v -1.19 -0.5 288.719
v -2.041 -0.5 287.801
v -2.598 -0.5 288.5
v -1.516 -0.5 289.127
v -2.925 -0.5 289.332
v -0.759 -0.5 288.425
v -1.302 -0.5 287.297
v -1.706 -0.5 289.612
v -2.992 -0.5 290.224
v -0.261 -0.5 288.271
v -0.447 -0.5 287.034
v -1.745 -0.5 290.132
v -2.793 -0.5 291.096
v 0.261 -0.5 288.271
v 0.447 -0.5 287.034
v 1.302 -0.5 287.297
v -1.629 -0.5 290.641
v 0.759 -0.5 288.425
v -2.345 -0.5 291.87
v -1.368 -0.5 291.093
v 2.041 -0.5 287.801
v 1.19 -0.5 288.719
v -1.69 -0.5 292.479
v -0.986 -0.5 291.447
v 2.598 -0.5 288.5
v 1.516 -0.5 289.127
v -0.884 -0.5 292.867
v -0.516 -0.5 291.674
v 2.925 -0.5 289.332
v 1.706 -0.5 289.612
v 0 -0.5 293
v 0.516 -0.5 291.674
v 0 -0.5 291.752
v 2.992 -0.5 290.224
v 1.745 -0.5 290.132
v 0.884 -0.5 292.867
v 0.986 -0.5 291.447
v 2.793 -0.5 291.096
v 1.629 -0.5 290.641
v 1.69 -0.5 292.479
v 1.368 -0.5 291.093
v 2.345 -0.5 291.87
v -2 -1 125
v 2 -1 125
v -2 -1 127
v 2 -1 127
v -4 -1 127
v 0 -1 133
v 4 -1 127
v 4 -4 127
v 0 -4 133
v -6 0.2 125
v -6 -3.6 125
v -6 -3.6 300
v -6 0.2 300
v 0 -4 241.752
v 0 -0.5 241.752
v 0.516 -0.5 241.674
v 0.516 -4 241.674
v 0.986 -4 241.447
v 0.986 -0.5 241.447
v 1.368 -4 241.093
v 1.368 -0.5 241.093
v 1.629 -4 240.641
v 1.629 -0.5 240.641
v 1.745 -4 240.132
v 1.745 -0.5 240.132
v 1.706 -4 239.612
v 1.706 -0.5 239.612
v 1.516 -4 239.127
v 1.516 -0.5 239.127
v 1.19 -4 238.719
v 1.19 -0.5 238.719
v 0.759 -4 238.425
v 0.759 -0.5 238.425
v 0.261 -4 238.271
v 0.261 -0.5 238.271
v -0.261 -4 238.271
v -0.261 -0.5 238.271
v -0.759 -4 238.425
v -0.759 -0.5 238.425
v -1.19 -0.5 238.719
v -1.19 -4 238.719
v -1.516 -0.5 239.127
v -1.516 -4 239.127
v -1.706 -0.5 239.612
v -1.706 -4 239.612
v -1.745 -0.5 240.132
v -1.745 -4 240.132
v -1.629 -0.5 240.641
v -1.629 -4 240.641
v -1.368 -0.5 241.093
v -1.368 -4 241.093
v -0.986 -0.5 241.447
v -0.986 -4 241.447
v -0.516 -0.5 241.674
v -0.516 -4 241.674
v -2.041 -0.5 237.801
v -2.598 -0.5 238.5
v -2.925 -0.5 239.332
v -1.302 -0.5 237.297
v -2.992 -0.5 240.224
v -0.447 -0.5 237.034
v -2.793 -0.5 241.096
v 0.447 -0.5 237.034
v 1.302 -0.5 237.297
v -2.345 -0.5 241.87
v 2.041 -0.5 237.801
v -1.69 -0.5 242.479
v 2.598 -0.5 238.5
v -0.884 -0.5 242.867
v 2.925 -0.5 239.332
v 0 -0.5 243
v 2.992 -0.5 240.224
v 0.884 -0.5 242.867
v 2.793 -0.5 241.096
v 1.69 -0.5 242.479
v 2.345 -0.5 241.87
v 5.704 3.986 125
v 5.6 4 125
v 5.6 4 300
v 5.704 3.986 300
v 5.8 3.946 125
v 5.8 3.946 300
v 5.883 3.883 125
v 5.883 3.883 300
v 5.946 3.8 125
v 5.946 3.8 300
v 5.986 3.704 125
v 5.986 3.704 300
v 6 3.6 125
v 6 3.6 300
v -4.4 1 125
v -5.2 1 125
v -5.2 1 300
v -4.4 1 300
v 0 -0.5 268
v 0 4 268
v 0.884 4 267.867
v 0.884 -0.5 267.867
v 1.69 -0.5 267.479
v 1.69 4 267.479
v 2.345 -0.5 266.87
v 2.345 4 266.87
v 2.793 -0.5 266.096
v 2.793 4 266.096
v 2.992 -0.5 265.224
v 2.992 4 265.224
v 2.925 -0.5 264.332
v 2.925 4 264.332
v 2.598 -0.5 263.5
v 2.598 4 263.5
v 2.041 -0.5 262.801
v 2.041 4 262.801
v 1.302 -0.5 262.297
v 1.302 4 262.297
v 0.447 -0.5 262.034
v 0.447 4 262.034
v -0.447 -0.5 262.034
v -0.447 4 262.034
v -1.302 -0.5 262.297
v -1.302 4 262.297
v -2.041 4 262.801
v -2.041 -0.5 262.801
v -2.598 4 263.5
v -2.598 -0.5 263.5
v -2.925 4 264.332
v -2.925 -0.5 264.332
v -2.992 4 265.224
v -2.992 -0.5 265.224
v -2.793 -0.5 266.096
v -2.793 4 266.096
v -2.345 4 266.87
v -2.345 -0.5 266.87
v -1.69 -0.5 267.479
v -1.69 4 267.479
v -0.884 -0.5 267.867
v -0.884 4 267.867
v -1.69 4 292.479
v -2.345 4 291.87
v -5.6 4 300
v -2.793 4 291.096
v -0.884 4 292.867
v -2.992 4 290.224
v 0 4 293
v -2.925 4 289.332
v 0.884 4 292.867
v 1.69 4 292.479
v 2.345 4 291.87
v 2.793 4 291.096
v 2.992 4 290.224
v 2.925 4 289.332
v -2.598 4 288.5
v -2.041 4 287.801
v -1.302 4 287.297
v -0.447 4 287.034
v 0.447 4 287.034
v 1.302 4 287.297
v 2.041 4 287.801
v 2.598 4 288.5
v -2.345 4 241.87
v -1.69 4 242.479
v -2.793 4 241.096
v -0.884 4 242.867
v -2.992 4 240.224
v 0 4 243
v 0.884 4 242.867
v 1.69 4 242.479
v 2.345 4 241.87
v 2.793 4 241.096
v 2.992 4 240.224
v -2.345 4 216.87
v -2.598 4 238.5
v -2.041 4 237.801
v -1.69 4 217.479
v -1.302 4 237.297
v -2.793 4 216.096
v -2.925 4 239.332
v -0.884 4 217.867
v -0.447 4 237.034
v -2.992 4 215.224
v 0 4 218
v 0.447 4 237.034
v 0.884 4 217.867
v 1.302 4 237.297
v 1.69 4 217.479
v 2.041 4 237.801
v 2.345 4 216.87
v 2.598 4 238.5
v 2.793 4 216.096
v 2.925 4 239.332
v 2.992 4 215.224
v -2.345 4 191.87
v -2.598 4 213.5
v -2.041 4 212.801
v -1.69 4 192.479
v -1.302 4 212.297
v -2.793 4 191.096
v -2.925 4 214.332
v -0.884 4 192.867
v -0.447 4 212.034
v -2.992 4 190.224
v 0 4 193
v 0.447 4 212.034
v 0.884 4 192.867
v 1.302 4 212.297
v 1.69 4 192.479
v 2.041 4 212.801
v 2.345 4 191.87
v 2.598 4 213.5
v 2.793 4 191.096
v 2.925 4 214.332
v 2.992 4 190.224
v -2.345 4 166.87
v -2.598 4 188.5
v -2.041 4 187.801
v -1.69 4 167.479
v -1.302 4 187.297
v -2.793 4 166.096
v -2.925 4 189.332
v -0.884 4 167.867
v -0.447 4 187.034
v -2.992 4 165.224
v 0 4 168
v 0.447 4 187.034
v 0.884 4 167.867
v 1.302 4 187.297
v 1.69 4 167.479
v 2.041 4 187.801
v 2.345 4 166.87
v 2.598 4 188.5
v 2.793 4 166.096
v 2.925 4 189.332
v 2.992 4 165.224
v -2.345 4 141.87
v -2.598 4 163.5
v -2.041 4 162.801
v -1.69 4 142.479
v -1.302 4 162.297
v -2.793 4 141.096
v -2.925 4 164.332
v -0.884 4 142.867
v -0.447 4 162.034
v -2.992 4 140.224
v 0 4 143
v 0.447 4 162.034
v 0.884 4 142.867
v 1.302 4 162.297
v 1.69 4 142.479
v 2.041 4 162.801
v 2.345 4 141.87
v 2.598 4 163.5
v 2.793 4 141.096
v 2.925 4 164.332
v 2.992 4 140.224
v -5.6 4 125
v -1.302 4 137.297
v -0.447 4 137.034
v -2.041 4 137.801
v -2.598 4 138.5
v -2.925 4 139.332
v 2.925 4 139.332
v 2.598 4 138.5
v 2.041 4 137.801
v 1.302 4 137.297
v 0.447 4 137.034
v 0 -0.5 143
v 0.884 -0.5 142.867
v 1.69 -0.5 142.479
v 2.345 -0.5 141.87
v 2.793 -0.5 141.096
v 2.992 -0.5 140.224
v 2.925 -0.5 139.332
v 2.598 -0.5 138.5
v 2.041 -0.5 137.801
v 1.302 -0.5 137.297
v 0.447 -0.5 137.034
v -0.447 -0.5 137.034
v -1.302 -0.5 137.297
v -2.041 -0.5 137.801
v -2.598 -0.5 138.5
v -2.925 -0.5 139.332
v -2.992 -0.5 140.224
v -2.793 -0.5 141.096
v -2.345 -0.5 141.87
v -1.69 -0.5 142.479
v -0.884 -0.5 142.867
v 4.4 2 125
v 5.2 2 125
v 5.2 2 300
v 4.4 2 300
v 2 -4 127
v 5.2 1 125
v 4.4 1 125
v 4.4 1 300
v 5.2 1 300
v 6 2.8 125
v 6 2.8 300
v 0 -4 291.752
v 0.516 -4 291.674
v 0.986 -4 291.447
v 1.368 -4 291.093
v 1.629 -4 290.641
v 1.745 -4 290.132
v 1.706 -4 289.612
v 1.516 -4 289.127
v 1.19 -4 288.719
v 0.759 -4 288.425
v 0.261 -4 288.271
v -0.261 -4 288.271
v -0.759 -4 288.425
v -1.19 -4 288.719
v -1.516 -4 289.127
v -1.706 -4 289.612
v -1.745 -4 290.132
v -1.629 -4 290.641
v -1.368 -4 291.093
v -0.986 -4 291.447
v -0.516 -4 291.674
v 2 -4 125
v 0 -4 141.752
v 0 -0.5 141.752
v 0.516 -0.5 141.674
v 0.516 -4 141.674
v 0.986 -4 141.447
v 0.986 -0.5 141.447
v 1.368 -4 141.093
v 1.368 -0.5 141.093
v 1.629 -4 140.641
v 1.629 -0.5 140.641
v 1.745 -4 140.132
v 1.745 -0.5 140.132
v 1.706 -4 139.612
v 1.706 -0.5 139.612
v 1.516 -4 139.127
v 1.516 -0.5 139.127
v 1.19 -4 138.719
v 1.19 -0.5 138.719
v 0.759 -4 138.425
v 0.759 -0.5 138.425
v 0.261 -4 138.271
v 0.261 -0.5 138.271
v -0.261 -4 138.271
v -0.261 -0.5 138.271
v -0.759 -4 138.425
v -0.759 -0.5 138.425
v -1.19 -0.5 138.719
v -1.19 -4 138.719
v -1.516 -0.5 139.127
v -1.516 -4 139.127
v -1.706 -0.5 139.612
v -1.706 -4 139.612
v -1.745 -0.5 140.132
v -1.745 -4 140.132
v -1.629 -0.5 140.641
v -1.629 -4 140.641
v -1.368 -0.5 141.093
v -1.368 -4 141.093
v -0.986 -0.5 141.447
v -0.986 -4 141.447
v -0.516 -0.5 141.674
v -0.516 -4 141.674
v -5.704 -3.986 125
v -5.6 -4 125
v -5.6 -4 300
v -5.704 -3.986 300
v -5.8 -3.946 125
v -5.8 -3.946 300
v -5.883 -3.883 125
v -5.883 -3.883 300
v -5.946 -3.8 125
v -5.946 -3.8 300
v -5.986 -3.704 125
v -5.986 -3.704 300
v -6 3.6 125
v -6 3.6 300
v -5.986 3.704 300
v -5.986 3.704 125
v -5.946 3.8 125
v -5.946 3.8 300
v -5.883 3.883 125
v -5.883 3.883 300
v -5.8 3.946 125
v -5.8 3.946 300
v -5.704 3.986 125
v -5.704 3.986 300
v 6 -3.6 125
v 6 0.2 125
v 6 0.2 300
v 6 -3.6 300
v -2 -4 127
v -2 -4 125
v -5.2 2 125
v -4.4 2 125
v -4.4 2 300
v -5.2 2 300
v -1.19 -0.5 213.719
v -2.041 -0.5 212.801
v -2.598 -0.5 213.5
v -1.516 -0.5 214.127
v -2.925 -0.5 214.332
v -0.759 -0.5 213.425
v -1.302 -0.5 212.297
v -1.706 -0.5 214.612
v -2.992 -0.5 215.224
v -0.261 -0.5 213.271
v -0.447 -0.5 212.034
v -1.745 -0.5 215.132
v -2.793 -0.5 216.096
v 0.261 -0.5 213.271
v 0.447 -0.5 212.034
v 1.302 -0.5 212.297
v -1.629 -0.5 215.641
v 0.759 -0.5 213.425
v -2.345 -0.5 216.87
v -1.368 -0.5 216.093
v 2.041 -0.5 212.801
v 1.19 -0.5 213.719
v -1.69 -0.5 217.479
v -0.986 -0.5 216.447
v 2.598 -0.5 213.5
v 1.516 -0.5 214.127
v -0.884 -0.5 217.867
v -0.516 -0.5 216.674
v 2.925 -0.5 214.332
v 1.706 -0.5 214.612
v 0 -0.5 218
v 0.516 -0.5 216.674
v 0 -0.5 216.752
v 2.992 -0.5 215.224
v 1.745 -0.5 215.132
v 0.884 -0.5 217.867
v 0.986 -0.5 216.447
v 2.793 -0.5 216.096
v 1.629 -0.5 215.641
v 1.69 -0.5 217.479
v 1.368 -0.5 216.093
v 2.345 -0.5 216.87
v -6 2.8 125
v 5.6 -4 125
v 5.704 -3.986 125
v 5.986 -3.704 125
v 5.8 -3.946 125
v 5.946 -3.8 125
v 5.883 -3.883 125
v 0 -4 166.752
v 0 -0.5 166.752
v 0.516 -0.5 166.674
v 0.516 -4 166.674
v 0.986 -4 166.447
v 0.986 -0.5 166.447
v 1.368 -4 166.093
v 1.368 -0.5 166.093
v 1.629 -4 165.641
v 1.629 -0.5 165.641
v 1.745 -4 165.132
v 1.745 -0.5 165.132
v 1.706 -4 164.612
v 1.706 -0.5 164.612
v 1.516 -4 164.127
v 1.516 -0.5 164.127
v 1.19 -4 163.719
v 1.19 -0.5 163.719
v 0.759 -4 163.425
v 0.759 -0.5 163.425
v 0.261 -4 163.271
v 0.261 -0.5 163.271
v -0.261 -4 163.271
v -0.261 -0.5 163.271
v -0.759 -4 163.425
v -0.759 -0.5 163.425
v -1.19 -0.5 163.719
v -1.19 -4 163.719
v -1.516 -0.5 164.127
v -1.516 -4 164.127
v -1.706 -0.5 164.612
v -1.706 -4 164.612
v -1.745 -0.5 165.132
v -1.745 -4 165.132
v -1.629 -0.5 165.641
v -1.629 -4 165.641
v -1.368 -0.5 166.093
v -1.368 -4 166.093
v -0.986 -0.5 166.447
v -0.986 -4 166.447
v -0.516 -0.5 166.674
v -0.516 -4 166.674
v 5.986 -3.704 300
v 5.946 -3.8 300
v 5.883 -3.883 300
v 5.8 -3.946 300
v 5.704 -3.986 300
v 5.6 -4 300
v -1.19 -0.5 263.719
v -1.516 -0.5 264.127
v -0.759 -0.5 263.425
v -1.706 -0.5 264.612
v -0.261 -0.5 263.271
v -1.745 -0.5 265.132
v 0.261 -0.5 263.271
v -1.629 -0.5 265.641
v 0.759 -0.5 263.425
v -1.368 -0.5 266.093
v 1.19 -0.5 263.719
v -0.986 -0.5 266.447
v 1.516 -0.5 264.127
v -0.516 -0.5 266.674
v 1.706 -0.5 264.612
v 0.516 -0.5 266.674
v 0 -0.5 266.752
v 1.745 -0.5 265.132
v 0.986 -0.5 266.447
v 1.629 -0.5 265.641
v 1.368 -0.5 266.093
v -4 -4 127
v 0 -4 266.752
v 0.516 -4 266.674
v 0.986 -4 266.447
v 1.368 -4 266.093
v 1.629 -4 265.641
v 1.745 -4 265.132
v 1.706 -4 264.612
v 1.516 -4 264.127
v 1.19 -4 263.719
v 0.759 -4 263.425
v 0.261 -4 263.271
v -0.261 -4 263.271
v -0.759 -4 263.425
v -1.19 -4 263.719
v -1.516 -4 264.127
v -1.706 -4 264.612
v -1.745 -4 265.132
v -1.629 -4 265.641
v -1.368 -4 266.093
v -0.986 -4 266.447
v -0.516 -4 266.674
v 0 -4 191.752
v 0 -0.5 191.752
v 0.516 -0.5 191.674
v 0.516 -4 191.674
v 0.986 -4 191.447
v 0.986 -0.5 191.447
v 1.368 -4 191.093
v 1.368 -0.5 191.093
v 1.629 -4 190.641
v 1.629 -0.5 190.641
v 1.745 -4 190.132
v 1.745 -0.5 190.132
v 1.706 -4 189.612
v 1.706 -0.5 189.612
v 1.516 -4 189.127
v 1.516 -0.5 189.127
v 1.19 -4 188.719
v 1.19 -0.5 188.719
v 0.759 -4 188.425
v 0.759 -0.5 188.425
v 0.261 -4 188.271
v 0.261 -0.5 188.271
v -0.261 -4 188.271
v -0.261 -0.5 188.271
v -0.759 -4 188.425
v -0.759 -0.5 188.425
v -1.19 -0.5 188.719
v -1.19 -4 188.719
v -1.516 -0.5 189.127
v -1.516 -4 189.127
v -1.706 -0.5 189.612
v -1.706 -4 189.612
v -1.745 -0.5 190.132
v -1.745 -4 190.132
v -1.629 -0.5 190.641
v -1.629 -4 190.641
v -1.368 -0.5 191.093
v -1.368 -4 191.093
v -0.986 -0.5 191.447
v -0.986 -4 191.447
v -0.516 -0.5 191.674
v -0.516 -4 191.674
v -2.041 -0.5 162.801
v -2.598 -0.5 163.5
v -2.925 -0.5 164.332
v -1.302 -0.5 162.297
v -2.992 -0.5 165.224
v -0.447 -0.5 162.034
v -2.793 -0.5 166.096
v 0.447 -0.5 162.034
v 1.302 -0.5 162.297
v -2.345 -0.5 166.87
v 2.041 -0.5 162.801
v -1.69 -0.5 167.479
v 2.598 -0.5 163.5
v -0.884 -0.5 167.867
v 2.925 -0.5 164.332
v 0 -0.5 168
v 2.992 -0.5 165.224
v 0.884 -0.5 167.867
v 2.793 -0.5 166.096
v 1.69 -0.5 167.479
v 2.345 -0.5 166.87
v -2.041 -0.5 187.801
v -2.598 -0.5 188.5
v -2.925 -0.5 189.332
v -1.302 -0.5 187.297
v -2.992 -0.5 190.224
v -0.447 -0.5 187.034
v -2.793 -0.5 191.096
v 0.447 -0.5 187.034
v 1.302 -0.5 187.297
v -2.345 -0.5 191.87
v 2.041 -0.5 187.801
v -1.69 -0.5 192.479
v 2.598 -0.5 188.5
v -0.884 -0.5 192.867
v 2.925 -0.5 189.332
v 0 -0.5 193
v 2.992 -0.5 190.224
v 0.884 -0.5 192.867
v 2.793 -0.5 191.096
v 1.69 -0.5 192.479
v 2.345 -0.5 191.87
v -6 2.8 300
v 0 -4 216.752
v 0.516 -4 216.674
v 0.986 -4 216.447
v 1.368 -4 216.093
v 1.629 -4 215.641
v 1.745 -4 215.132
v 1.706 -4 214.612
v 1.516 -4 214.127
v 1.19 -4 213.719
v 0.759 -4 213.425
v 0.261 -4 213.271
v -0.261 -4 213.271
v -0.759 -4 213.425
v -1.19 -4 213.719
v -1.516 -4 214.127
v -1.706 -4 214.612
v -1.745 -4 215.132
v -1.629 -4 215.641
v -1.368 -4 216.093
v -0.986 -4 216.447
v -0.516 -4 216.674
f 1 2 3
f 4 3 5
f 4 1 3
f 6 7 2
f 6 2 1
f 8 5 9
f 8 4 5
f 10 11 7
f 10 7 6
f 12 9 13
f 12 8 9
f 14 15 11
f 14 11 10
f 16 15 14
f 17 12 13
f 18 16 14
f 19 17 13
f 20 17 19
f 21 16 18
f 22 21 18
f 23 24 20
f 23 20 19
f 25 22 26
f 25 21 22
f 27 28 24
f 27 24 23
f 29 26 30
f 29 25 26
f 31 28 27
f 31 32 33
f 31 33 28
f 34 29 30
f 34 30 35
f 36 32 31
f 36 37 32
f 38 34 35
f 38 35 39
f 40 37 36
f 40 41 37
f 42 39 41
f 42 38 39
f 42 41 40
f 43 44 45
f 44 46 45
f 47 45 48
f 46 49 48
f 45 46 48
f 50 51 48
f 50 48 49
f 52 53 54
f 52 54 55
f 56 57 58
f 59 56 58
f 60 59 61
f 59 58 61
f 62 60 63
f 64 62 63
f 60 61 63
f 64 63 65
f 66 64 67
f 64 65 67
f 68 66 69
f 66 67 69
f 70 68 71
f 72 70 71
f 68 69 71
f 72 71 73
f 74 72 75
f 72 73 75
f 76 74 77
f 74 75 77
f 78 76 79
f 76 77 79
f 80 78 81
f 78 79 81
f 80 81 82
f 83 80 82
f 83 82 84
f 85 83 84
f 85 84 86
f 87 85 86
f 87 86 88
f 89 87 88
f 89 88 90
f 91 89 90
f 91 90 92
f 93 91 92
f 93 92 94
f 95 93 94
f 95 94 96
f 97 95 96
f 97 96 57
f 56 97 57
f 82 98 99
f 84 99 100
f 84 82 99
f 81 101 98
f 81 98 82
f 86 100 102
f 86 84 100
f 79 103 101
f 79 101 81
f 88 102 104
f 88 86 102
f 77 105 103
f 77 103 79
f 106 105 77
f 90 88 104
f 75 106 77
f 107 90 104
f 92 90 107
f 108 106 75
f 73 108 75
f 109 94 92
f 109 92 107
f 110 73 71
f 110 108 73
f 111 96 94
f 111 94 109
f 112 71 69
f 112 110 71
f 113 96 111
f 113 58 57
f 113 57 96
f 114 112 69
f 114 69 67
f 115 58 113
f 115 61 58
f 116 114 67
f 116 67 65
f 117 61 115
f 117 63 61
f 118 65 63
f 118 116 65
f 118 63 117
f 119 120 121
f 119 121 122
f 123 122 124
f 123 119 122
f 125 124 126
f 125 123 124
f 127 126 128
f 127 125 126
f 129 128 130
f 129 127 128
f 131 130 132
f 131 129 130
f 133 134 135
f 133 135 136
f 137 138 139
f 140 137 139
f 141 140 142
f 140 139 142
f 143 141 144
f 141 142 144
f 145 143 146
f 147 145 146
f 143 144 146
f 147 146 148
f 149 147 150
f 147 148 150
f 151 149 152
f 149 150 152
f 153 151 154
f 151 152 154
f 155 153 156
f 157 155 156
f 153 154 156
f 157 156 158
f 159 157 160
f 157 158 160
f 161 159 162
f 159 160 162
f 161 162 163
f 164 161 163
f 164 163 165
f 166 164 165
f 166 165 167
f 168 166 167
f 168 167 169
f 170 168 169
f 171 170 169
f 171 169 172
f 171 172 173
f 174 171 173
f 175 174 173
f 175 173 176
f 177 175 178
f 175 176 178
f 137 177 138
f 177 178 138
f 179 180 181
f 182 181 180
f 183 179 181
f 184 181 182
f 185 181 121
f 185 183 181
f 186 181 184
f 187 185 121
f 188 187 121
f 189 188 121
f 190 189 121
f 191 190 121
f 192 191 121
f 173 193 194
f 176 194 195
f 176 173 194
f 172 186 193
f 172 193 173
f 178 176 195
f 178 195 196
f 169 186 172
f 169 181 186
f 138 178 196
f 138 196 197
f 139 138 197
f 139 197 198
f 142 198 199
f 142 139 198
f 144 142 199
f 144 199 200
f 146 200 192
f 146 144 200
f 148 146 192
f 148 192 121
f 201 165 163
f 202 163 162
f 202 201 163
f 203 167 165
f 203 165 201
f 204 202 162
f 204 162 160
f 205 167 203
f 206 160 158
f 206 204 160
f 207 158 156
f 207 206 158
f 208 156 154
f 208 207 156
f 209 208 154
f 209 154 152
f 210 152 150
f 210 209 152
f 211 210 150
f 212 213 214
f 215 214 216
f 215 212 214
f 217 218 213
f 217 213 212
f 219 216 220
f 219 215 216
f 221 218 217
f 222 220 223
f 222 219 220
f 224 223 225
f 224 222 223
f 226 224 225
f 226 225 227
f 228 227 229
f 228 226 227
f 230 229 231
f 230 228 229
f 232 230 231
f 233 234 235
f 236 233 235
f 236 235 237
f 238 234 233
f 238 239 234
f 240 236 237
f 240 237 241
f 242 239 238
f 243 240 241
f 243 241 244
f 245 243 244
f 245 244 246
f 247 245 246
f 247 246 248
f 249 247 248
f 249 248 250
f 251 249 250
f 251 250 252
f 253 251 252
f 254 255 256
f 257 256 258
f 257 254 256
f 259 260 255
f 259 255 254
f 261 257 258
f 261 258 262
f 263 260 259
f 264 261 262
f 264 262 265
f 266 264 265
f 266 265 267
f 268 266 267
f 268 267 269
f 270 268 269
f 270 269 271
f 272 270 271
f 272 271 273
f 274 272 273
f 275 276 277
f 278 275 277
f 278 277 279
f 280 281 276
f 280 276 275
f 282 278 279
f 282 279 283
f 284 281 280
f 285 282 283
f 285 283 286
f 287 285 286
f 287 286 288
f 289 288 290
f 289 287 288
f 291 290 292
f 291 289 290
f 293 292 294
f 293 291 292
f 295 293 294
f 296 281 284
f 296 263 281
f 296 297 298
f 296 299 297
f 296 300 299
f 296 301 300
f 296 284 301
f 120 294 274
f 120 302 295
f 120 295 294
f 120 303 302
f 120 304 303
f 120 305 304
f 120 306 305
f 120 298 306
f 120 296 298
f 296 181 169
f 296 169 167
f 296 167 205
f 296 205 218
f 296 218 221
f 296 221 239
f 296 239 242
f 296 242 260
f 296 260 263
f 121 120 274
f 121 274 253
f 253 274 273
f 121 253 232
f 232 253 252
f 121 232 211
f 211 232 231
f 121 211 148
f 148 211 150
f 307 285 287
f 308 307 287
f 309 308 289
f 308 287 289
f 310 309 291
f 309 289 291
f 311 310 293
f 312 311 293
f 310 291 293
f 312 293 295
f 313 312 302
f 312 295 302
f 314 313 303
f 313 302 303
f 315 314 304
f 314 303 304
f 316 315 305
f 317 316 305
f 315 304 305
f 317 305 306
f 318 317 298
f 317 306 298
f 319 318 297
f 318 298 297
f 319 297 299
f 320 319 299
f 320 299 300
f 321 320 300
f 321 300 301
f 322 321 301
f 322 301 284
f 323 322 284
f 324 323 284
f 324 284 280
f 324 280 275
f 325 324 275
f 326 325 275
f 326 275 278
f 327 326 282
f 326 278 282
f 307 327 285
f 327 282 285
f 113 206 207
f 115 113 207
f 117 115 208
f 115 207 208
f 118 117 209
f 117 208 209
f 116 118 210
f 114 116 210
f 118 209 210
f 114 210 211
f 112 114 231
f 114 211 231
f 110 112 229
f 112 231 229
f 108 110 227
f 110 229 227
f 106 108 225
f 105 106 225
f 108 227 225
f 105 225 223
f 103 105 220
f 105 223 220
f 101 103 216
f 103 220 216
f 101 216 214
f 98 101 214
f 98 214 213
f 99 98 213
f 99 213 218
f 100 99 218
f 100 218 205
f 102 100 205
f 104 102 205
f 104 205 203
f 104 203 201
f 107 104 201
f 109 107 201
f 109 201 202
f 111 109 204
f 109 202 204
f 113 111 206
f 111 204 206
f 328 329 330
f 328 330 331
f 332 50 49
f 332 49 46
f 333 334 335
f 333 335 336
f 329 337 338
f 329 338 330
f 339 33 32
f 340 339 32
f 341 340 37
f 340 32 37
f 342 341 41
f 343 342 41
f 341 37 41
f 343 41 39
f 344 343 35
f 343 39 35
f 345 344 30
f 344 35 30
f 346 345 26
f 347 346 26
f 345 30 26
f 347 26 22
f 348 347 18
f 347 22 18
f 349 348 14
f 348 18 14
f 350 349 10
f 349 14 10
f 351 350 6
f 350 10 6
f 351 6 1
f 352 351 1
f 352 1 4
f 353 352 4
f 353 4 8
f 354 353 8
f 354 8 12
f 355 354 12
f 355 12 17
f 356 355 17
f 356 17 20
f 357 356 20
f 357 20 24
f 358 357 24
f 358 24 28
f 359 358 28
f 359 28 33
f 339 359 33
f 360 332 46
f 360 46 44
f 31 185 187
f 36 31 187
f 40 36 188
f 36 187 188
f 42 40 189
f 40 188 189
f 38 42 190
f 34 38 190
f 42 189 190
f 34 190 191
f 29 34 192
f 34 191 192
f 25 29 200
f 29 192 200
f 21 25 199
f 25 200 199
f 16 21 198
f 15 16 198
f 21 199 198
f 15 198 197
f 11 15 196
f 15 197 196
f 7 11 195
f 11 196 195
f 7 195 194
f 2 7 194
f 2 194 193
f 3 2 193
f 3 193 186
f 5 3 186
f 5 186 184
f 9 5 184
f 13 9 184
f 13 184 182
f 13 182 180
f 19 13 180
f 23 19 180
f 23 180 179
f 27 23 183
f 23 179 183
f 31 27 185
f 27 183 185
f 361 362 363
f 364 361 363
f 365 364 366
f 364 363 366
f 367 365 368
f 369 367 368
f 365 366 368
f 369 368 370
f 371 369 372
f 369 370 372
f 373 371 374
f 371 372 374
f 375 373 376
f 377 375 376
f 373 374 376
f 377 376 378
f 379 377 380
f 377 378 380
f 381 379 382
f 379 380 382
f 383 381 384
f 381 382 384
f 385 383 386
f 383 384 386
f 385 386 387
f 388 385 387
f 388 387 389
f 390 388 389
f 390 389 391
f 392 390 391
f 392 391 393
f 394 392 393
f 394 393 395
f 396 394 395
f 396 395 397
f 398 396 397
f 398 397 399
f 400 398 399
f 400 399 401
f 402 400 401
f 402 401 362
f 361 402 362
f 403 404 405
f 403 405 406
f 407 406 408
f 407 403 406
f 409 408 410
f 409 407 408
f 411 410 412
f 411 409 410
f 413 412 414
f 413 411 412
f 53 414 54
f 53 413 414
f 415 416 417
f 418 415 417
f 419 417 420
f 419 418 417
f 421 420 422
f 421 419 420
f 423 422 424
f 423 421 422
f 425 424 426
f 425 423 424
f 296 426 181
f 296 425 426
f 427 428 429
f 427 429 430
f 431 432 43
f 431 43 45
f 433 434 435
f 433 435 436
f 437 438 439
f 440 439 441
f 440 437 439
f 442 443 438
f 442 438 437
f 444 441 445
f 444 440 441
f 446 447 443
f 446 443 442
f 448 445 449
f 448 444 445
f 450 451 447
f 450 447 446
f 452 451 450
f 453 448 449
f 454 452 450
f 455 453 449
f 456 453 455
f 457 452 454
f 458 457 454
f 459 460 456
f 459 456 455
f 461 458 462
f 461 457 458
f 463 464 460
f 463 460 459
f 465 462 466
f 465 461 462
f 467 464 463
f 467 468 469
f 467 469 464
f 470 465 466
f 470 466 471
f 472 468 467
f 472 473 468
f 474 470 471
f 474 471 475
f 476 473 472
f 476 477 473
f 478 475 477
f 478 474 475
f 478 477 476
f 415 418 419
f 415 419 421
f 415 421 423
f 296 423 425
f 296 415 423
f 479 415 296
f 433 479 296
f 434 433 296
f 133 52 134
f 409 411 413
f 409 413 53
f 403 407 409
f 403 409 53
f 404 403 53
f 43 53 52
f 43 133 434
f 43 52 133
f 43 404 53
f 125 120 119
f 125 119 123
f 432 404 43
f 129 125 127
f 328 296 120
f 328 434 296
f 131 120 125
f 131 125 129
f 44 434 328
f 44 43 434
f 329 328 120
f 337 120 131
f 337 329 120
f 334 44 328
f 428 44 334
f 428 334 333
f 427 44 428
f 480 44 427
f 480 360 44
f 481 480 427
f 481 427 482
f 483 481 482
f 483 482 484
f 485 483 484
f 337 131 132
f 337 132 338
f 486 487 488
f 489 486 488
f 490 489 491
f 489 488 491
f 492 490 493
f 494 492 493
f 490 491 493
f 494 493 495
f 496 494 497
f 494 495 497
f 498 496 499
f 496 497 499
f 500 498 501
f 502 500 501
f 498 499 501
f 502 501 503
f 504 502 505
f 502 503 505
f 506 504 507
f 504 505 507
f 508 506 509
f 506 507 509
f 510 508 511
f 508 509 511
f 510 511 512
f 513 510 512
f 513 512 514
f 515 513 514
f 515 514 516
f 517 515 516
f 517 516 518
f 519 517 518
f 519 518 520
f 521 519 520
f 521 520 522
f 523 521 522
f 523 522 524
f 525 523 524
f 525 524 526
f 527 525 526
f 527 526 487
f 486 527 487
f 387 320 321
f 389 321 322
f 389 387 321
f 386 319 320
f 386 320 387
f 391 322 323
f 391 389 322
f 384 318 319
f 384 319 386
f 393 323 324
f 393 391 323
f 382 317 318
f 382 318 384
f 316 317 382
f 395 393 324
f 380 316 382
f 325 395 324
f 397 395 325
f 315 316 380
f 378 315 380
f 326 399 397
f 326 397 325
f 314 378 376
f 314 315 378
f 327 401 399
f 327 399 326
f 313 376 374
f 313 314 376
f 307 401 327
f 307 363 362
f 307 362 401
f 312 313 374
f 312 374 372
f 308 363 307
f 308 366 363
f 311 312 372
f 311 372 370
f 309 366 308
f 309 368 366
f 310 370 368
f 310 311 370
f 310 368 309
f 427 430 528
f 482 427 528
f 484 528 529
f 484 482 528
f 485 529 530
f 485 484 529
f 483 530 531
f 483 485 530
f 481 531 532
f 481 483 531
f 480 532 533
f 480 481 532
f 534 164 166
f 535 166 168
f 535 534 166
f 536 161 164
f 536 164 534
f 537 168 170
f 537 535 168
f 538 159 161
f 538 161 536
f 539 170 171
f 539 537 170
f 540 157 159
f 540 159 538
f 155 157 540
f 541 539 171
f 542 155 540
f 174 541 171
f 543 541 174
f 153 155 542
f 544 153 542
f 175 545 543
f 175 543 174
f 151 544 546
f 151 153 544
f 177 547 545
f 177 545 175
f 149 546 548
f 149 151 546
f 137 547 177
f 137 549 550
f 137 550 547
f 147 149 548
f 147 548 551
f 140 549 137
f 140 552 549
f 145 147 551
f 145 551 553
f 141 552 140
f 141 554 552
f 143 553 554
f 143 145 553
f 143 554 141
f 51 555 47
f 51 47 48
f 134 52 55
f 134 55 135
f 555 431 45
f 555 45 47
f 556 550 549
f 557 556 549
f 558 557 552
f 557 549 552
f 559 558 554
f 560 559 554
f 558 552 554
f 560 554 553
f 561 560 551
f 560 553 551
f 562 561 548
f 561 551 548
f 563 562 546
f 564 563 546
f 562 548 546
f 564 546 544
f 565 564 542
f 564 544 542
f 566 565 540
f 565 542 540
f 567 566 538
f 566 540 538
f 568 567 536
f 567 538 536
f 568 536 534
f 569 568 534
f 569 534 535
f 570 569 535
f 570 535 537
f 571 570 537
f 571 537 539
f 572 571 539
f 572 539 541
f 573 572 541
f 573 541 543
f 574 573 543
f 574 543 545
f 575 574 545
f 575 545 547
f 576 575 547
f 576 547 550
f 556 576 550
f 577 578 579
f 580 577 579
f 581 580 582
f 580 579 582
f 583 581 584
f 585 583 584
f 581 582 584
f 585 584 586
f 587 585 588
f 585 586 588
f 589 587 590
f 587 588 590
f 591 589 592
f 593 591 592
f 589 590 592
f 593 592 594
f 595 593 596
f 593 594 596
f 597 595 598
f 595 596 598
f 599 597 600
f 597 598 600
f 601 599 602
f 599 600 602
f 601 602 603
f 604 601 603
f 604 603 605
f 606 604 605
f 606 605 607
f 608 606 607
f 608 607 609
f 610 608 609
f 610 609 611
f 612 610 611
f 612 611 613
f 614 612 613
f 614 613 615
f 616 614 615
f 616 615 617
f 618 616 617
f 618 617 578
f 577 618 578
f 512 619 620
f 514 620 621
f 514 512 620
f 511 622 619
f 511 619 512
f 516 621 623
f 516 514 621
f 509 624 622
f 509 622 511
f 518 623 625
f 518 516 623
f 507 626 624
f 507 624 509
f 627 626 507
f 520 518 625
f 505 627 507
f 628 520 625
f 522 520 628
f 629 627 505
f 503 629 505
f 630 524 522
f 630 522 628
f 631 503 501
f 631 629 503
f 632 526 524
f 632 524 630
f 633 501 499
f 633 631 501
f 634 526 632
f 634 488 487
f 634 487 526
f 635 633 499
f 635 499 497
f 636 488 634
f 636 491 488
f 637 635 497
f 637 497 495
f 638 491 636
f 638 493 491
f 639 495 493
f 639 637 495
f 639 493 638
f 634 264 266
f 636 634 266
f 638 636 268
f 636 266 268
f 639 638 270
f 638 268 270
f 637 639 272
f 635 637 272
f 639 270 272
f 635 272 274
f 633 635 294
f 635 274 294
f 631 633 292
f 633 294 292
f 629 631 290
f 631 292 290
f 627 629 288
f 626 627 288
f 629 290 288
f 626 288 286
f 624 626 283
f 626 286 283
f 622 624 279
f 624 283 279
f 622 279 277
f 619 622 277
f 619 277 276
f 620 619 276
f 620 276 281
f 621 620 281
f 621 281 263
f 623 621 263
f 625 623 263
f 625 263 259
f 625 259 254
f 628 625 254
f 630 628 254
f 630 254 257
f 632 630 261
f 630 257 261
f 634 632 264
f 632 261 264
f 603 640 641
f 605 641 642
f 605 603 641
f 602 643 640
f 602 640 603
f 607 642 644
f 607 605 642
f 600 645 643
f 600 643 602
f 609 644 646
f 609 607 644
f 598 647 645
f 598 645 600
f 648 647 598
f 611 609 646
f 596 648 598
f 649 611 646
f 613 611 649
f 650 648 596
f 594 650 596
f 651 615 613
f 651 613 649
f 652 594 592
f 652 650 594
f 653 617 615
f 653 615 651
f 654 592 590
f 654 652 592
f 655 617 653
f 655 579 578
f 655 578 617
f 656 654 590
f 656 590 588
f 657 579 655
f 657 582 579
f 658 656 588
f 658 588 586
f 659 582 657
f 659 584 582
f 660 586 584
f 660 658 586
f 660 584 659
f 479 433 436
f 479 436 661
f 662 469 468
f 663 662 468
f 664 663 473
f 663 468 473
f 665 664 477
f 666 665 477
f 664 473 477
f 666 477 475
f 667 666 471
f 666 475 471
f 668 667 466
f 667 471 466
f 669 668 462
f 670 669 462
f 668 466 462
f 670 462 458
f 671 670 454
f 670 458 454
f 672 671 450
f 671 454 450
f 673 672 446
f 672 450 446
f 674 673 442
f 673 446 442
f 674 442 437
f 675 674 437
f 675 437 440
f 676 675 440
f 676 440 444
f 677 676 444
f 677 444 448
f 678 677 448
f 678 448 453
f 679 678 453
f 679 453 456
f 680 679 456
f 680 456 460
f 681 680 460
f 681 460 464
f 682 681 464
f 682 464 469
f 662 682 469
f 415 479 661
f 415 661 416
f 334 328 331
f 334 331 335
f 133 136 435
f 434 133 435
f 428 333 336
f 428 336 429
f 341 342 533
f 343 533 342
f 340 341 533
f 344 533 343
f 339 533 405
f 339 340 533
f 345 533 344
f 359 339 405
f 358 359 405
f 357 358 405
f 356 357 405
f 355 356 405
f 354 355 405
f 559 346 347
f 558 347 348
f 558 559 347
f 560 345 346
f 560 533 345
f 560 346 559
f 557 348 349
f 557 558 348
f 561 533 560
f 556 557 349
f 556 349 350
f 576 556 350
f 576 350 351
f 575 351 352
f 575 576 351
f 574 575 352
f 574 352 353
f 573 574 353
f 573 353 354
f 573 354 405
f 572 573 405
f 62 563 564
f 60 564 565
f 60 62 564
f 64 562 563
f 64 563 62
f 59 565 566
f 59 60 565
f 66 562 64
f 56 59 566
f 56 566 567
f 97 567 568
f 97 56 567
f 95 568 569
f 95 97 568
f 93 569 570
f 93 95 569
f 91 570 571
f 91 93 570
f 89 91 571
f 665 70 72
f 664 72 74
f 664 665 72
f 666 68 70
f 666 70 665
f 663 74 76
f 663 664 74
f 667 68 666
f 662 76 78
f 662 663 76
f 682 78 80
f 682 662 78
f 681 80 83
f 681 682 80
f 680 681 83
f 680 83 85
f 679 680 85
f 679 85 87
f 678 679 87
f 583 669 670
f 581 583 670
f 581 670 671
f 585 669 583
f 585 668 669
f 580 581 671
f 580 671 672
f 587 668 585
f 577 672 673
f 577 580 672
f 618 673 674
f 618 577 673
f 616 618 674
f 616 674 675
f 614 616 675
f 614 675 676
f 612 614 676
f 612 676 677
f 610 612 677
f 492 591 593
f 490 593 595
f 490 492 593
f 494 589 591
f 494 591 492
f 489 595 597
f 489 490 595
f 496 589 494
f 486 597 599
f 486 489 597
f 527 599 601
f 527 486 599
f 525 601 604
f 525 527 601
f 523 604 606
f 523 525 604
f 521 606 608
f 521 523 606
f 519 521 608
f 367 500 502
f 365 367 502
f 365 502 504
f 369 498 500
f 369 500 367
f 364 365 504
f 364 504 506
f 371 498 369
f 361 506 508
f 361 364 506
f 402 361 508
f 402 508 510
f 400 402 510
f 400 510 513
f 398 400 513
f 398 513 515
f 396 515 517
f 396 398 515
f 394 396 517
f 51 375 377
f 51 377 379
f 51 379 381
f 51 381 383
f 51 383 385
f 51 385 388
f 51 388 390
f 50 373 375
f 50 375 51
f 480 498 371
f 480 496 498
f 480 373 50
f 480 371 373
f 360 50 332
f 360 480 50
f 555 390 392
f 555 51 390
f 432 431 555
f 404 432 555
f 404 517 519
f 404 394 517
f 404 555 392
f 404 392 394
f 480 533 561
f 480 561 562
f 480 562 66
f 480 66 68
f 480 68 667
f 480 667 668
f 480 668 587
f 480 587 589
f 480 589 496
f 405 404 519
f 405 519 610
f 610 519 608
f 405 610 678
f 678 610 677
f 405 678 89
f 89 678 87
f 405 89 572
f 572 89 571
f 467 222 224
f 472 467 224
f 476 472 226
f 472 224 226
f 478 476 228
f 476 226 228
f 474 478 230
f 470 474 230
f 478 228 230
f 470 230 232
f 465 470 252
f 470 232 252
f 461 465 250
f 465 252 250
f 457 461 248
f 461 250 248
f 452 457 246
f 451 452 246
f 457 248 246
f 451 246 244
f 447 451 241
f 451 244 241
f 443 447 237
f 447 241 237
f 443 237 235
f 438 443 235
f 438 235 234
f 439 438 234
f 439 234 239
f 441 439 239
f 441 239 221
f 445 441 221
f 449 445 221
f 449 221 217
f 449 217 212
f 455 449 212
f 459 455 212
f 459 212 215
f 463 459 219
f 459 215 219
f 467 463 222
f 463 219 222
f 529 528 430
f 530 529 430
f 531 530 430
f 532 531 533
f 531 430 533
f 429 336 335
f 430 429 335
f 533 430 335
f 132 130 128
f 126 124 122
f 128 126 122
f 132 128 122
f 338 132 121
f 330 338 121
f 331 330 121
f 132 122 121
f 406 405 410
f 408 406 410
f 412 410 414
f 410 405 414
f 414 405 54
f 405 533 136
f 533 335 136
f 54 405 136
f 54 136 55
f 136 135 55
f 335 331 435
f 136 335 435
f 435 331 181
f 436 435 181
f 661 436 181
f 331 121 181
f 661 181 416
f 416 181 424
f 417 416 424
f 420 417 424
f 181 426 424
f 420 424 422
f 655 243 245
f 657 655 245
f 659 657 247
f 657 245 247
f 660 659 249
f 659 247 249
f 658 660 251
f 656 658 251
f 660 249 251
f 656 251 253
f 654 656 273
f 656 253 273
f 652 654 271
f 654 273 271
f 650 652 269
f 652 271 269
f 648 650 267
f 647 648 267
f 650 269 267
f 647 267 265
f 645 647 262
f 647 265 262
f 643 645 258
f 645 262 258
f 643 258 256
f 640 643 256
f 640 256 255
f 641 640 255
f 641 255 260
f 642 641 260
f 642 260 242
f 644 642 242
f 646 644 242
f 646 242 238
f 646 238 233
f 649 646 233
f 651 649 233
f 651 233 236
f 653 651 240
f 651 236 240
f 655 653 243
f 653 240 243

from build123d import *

# Parameters (mm, degrees)
BOSS_EXTRUDE1_DEPTH = 300
SKETCH2_R           = 3
CUT_EXTRUDE1_DEPTH  = 4.5
SKETCH3_R           = 1.75
CUT_EXTRUDE2_DEPTH  = 301.166620396
CUT_EXTRUDE3_DEPTH  = 3
SKETCH5_W           = 12
SKETCH5_H           = 125
CUT_EXTRUDE5_DEPTH  = 301.101649446


with BuildPart() as part:
    # Sketch1 → Boss-Extrude1 (new body)
    with BuildSketch(Plane.XY):
        with BuildLine():
            Line((-5.6, 4), (5.6, 4))
            ThreePointArc((5.6, 4), (5.882842712, 3.882842712), (6, 3.6))
            Line((6, 3.6), (6, 2.8))
            Line((6, 2.8), (5.2, 2))
            Line((5.2, 2), (4.4, 2))
            Line((4.4, 2), (4.4, 1))
            Line((4.4, 1), (5.2, 1))
            Line((5.2, 1), (6, 0.2))
            Line((6, 0.2), (6, -3.6))
            ThreePointArc((6, -3.6), (5.882842712, -3.882842712), (5.6, -4))
            Line((5.6, -4), (-5.6, -4))
            ThreePointArc((-5.6, -4), (-5.882842712, -3.882842712), (-6, -3.6))
            Line((-6, -3.6), (-6, 0.2))
            Line((-6, 0.2), (-5.2, 1))
            Line((-5.2, 1), (-4.4, 1))
            Line((-4.4, 1), (-4.4, 2))
            Line((-4.4, 2), (-5.2, 2))
            Line((-5.2, 2), (-6, 2.8))
            Line((-6, 2.8), (-6, 3.6))
            ThreePointArc((-6, 3.6), (-5.882842712, 3.882842712), (-5.6, 4))
        make_face()
    extrude(amount=BOSS_EXTRUDE1_DEPTH)

    # Sketch2 → Cut-Extrude1 (cut)
    with BuildSketch(Plane(origin=(0, 4, 0), x_dir=(1, 0, 0), z_dir=(0, 1, 0))):
        with Locations(Location((0, -290, 0), (0, 0, 270))):
            Circle(SKETCH2_R)
        with Locations(Location((0, -265, 0), (0, 0, 270))):
            Circle(SKETCH2_R)
        with Locations(Location((0, -240, 0), (0, 0, 270))):
            Circle(SKETCH2_R)
        with Locations(Location((0, -215, 0), (0, 0, 270))):
            Circle(SKETCH2_R)
        with Locations(Location((0, -190, 0), (0, 0, 270))):
            Circle(SKETCH2_R)
        with Locations(Location((0, -165, 0), (0, 0, 270))):
            Circle(SKETCH2_R)
        with Locations(Location((0, -140, 0), (0, 0, 270))):
            Circle(SKETCH2_R)
        with Locations(Location((0, -115, 0), (0, 0, 270))):
            Circle(SKETCH2_R)
        with Locations(Location((0, -90, 0), (0, 0, 270))):
            Circle(SKETCH2_R)
        with Locations(Location((0, -65, 0), (0, 0, 270))):
            Circle(SKETCH2_R)
        with Locations(Location((0, -40, 0), (0, 0, 270))):
            Circle(SKETCH2_R)
        with Locations(Location((0, -15, 0), (0, 0, 270))):
            Circle(SKETCH2_R)
        with Locations((0, 10)):
            Circle(SKETCH2_R)
        with Locations((0, 35)):
            Circle(SKETCH2_R)
        with Locations((0, 60)):
            Circle(SKETCH2_R)
        with Locations((0, 85)):
            Circle(SKETCH2_R)
        with Locations((0, 110)):
            Circle(SKETCH2_R)
        with Locations((0, 135)):
            Circle(SKETCH2_R)
    extrude(amount=-CUT_EXTRUDE1_DEPTH, mode=Mode.SUBTRACT)

    # Sketch3 → Cut-Extrude2 (cut, through all)
    with BuildSketch(Plane(origin=(0, 4, 0), x_dir=(1, 0, 0), z_dir=(0, 1, 0))):
        with Locations(Location((0, -290.001504258, 0), (0, 0, 270))):
            Circle(SKETCH3_R)
        with Locations(Location((0, -265.001504258, 0), (0, 0, 270))):
            Circle(SKETCH3_R)
        with Locations(Location((0, -240.001504258, 0), (0, 0, 270))):
            Circle(SKETCH3_R)
        with Locations(Location((0, -215.001504258, 0), (0, 0, 270))):
            Circle(SKETCH3_R)
        with Locations(Location((0, -190.001504258, 0), (0, 0, 270))):
            Circle(SKETCH3_R)
        with Locations(Location((0, -165.001504258, 0), (0, 0, 270))):
            Circle(SKETCH3_R)
        with Locations(Location((0, -140.001504258, 0), (0, 0, 270))):
            Circle(SKETCH3_R)
        with Locations(Location((0, -115.001504258, 0), (0, 0, 270))):
            Circle(SKETCH3_R)
        with Locations(Location((0, -90.001504258, 0), (0, 0, 270))):
            Circle(SKETCH3_R)
        with Locations(Location((0, -65.001504258, 0), (0, 0, 270))):
            Circle(SKETCH3_R)
        with Locations(Location((0, -40.001504258, 0), (0, 0, 270))):
            Circle(SKETCH3_R)
        with Locations(Location((0, -15.001504258, 0), (0, 0, 270))):
            Circle(SKETCH3_R)
        with Locations((0, 9.998495742)):
            Circle(SKETCH3_R)
        with Locations((0, 34.998495742)):
            Circle(SKETCH3_R)
        with Locations((0, 59.998495742)):
            Circle(SKETCH3_R)
    extrude(amount=-CUT_EXTRUDE2_DEPTH, mode=Mode.SUBTRACT)

    # Sketch4 → Cut-Extrude3 (cut)
    with BuildSketch(Plane.XZ.offset(4)):
        Polygon((-6, 125), (-2, 125), (-2, 127), (-4, 127), (0, 133), (4, 127), (2, 127), (2, 125), (6, 125), (29.677261244, -70.087794046), (-63.472645217, -88.905956967), align=None)
    extrude(amount=-CUT_EXTRUDE3_DEPTH, mode=Mode.SUBTRACT)

    # Sketch5 → Cut-Extrude5 (cut, through all)
    with BuildSketch(Plane.XZ.offset(1)):
        with Locations((0, 62.5)):
            Rectangle(SKETCH5_W, SKETCH5_H)
    extrude(amount=-CUT_EXTRUDE5_DEPTH, mode=Mode.SUBTRACT)


solid = part.part
